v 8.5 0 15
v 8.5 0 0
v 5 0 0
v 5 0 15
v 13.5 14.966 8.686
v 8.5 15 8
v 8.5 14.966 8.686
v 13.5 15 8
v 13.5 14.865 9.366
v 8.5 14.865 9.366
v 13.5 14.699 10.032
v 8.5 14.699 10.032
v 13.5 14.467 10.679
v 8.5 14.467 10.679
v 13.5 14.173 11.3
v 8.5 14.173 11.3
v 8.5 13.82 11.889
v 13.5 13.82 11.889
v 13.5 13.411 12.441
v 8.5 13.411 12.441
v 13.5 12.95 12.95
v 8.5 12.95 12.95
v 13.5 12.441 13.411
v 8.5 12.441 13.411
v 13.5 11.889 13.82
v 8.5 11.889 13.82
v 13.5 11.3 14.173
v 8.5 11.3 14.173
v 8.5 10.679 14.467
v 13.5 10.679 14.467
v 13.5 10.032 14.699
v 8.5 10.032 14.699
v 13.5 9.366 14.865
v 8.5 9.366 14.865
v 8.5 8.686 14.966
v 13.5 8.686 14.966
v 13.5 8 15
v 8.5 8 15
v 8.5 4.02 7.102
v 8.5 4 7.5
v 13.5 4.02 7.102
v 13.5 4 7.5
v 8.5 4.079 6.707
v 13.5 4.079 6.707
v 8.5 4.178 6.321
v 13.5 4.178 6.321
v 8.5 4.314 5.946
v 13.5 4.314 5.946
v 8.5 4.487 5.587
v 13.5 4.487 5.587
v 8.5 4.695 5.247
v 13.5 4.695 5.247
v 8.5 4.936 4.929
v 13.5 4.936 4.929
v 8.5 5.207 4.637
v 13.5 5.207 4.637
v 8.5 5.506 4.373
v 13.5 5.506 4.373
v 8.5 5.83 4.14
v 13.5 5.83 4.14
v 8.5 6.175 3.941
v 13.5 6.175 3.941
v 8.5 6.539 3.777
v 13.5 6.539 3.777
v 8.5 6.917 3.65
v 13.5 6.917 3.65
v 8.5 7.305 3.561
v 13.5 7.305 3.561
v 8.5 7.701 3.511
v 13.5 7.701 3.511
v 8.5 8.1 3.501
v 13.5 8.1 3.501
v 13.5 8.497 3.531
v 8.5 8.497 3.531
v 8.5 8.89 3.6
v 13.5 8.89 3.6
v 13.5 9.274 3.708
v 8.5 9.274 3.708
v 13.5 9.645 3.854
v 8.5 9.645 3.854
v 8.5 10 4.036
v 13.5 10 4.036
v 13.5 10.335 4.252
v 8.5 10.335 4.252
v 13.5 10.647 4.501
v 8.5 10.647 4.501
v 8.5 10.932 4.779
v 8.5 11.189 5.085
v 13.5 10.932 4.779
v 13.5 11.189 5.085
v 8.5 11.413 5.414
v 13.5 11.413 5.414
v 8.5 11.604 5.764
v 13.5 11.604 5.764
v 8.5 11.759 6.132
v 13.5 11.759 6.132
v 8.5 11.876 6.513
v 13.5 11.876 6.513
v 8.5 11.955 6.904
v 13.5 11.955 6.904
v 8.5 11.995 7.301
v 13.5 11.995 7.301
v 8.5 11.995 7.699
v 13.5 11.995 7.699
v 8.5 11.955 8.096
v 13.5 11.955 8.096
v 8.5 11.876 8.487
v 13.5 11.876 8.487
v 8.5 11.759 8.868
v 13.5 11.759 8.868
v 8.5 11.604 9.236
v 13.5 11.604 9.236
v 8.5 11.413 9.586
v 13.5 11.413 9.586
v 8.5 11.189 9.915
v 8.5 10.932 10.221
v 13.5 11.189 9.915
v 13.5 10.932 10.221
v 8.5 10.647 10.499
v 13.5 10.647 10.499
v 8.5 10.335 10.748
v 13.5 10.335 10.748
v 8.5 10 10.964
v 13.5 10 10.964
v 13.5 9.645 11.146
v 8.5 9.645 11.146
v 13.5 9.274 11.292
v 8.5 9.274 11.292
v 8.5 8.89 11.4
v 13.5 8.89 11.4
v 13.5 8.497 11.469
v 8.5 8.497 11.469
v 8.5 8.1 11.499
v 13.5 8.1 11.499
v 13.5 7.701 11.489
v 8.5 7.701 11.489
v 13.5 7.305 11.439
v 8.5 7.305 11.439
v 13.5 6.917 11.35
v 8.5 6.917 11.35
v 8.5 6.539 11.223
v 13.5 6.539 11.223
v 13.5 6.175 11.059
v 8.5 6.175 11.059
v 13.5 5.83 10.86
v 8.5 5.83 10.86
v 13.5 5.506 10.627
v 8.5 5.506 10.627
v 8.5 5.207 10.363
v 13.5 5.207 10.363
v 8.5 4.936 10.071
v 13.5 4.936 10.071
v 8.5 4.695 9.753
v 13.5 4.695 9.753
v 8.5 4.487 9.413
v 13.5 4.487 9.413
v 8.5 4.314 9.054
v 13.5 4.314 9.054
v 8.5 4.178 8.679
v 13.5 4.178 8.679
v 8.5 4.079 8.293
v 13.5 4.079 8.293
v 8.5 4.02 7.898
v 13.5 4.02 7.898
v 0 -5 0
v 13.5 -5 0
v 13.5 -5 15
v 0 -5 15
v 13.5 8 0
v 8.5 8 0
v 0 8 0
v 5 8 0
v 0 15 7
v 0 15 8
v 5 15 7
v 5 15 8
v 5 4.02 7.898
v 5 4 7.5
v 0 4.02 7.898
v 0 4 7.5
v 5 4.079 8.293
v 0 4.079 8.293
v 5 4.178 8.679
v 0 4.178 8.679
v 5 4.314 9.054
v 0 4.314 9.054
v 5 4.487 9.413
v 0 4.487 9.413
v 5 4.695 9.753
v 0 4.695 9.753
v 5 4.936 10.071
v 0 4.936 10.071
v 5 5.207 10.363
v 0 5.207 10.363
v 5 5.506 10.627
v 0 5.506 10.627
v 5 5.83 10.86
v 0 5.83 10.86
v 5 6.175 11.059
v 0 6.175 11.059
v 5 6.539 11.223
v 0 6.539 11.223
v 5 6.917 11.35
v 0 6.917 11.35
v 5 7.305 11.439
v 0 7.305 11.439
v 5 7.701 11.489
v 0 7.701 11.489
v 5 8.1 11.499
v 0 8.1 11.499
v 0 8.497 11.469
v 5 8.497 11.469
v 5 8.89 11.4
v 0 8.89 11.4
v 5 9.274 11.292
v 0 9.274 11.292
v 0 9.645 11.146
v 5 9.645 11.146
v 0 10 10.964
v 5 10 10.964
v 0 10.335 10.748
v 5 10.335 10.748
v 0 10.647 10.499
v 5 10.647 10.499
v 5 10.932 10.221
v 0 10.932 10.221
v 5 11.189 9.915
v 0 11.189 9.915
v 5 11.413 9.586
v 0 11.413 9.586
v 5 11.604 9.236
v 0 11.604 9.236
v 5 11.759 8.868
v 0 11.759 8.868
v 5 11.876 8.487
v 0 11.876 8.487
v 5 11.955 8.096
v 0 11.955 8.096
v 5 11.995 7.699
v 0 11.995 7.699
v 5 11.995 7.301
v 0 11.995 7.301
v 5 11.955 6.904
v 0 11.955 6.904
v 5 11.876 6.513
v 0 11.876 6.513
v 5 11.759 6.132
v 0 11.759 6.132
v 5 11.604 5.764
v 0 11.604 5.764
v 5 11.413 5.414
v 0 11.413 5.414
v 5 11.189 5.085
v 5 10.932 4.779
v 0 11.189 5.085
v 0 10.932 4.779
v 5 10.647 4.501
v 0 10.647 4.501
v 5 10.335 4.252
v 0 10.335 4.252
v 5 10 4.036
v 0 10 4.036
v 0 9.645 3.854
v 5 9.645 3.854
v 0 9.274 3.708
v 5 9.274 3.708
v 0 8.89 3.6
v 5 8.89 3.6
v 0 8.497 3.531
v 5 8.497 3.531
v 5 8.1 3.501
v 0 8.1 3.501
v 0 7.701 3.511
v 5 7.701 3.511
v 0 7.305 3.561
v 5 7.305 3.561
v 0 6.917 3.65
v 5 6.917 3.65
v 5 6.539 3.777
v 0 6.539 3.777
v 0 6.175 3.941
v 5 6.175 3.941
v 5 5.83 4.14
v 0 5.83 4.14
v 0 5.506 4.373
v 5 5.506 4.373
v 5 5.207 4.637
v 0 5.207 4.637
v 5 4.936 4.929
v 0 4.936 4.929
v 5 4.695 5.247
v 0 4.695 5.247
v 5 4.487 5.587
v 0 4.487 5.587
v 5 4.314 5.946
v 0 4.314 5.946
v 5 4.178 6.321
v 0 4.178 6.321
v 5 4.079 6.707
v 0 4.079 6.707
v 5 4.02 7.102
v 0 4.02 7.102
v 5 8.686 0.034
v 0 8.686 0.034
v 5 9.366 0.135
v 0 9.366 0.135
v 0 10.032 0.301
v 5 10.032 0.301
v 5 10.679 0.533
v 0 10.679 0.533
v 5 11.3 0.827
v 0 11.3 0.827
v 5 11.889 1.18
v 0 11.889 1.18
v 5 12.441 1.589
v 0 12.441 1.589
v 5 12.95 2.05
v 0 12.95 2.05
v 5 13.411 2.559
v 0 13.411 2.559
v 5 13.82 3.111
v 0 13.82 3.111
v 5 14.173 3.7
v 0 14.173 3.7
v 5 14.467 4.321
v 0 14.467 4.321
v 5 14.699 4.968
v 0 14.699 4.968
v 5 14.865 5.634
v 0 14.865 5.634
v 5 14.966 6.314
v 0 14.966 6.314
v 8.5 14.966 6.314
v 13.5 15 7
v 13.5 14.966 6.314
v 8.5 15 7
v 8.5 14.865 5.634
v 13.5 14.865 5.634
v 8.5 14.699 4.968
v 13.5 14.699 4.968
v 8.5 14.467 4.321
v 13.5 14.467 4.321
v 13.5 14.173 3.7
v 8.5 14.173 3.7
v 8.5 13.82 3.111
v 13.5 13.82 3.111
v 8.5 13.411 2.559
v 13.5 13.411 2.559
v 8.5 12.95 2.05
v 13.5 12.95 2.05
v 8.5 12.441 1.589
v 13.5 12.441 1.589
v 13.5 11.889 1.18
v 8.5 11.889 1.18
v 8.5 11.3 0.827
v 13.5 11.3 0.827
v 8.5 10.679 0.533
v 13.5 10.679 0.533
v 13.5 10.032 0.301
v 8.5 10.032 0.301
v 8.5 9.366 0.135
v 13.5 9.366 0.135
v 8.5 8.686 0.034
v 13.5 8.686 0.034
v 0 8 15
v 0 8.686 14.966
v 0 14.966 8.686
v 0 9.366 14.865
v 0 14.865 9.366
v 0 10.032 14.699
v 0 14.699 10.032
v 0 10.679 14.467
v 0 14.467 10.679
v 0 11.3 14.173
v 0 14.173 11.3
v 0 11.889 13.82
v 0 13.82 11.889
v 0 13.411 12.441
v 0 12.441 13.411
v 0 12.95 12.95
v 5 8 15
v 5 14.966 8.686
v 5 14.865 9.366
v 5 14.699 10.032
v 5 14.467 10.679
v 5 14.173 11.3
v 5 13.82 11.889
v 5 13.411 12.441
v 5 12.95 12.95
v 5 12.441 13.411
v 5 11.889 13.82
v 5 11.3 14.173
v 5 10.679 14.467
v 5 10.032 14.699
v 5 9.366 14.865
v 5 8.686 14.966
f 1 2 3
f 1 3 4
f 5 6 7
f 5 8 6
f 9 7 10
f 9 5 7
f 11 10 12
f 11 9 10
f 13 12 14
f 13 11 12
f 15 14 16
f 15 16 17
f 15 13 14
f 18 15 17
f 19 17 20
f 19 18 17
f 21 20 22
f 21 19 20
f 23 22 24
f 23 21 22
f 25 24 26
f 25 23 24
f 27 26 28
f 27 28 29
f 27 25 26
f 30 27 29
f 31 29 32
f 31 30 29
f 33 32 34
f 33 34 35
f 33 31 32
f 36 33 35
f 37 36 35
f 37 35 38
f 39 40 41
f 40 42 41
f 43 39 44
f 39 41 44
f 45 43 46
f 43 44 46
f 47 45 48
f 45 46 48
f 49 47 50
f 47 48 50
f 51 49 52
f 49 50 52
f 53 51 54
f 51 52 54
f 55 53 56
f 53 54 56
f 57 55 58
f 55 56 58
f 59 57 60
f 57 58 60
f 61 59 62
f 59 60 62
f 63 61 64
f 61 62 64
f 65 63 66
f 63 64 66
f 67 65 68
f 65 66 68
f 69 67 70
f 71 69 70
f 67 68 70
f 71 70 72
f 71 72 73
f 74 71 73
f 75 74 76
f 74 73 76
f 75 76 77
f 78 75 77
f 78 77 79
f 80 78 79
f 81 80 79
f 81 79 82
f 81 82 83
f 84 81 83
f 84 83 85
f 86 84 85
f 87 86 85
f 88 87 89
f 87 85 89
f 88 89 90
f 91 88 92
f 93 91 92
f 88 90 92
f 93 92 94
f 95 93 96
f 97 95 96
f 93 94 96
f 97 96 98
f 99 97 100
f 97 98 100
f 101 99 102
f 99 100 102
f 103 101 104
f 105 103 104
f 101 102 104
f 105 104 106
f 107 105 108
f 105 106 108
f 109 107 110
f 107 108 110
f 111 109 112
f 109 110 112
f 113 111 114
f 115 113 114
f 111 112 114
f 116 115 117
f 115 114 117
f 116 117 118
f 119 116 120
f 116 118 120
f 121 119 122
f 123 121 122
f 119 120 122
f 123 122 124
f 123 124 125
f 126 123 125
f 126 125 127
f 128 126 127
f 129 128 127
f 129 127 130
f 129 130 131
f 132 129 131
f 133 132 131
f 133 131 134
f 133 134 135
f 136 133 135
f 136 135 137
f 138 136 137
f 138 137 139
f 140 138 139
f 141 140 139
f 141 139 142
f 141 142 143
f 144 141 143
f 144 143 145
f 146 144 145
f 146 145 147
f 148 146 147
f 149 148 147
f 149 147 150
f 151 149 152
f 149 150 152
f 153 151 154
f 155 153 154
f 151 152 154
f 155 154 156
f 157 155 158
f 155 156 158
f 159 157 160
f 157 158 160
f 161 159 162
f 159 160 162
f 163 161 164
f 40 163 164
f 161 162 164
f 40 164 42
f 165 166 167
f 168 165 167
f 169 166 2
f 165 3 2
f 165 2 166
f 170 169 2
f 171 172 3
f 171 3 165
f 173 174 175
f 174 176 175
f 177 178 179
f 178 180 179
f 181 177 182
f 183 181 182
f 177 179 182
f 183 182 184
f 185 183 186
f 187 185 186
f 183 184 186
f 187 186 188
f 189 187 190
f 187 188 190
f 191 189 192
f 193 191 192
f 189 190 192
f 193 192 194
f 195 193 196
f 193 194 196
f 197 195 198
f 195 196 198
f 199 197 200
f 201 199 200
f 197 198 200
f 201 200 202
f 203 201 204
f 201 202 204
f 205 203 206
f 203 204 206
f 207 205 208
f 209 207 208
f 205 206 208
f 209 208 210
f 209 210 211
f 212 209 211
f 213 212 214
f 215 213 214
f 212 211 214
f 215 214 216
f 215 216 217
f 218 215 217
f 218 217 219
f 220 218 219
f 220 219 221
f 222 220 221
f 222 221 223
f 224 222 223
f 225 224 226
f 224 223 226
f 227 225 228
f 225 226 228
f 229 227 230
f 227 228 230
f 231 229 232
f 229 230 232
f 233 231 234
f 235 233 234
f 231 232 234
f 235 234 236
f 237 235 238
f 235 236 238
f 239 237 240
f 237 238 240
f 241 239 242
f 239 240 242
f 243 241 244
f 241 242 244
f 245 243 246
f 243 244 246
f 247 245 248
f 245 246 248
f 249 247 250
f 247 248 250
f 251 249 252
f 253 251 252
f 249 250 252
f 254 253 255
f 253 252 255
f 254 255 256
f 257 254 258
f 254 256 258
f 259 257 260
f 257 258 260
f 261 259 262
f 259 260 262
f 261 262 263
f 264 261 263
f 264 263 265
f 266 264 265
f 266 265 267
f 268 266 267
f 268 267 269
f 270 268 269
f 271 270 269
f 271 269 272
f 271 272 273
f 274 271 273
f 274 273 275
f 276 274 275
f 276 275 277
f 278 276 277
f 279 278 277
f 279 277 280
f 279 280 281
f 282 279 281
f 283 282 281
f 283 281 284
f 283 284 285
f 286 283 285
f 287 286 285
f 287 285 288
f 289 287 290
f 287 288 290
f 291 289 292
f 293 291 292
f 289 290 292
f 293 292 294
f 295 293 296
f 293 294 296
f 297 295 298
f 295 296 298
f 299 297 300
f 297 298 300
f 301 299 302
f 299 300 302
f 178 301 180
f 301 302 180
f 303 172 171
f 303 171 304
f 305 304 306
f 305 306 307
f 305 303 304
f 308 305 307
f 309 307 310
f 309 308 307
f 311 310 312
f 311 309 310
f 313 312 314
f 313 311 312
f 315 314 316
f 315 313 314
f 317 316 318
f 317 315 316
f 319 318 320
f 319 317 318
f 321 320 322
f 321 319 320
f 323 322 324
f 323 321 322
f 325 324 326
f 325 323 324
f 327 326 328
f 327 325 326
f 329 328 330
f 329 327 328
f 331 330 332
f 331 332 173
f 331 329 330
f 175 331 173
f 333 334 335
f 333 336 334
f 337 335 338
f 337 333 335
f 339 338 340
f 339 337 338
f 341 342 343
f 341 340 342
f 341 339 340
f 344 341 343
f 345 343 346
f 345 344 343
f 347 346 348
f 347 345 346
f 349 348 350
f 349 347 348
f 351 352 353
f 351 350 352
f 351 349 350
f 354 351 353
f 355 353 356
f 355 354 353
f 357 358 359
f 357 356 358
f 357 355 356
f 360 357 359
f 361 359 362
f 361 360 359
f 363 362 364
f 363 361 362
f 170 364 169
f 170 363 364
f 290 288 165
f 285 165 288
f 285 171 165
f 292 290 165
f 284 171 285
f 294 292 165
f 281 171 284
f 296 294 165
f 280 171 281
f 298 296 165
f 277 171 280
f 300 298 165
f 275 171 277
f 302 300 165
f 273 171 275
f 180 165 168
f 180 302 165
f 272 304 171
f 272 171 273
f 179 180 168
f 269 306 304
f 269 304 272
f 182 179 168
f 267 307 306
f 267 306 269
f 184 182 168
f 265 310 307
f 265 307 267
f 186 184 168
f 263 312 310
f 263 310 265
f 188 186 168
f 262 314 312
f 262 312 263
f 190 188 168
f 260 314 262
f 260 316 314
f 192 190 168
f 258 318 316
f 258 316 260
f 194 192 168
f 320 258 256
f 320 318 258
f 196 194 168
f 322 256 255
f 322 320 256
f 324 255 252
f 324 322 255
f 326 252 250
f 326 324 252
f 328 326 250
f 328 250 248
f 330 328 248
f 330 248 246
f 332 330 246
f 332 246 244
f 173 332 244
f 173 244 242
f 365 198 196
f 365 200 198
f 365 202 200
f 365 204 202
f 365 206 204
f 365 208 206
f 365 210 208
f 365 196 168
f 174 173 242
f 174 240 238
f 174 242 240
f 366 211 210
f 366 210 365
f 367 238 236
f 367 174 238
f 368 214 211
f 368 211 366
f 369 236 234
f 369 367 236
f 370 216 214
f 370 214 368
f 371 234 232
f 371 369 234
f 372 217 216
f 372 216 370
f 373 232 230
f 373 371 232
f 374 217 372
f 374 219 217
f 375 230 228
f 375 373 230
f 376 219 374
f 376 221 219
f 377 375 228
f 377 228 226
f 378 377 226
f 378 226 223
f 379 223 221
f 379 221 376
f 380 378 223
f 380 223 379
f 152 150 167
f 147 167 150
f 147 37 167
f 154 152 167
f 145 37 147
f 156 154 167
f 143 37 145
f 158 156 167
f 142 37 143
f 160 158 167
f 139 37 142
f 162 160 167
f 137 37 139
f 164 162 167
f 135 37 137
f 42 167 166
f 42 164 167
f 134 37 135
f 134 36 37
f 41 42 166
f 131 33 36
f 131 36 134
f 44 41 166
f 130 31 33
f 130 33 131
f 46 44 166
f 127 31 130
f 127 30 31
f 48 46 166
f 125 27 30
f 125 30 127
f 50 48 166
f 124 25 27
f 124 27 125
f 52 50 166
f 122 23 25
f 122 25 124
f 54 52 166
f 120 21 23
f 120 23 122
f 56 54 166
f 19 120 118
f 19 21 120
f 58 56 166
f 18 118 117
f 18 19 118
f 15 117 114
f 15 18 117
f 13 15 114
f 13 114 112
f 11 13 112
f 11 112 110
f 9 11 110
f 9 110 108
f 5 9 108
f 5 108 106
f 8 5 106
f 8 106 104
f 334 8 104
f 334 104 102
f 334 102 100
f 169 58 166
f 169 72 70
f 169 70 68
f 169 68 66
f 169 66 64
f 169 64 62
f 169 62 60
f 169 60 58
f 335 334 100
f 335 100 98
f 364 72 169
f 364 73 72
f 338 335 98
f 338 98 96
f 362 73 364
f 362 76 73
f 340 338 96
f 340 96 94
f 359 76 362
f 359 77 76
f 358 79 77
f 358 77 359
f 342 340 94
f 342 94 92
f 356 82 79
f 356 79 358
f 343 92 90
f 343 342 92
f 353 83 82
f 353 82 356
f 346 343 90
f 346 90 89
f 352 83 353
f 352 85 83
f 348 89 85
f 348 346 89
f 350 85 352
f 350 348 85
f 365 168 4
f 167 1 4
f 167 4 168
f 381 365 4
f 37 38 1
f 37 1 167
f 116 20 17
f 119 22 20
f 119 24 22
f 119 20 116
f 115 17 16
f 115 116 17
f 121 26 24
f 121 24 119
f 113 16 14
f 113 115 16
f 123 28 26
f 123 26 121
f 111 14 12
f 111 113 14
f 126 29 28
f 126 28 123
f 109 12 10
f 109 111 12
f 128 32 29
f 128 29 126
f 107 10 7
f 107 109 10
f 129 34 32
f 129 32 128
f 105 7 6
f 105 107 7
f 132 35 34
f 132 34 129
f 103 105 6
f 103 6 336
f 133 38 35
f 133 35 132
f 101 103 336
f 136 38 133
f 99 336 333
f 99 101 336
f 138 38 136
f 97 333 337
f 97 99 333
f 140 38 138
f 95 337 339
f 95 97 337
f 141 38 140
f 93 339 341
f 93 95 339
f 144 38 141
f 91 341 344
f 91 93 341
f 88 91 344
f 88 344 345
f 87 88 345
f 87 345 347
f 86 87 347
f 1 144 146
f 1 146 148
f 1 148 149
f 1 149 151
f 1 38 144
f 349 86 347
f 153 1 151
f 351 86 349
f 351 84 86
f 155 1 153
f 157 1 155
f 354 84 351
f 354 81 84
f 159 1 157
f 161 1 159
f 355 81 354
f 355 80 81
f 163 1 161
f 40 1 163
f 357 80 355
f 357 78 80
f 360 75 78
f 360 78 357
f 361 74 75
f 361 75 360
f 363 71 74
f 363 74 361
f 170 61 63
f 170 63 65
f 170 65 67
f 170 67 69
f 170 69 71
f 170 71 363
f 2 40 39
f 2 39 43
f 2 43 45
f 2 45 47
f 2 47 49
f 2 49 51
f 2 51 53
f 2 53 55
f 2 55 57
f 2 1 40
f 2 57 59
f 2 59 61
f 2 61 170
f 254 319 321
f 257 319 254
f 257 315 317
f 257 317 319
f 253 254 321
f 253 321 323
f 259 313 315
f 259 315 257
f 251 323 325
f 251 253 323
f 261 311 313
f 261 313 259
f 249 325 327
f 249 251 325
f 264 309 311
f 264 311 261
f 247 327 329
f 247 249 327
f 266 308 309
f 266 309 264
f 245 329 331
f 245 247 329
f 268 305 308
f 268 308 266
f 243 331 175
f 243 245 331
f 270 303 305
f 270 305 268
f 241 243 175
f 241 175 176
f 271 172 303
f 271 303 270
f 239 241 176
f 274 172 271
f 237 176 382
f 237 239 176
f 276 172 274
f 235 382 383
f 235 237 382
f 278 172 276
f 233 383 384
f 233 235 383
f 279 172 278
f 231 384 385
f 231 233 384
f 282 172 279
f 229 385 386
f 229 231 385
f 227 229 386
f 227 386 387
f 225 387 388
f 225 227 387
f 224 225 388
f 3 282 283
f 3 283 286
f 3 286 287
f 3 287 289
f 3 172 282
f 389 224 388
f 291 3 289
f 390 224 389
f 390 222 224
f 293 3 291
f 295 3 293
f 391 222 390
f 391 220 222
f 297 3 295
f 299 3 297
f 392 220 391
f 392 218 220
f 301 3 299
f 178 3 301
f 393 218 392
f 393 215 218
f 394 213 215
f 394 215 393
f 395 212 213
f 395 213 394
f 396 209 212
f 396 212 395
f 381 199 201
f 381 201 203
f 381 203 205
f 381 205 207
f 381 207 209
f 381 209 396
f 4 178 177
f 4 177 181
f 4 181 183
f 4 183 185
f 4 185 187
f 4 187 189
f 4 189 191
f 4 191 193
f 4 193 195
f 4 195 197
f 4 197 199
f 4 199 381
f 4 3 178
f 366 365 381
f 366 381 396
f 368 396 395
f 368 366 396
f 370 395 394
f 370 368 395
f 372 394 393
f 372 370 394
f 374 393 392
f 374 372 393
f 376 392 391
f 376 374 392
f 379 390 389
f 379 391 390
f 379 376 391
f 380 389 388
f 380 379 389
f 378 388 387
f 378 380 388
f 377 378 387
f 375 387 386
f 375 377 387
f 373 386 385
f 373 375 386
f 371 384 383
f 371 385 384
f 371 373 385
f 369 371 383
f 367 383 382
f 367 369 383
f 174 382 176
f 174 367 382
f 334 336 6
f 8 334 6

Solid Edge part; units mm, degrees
sketch "Sketch1" plane through (0, 0, 0) normal (0, -1, 0) x (1, 0, 0)
  line L0 (13.5, 0) -> (0, 0)
  line L1 (0, 0) -> (0, 15)
  line L2 (0, 15) -> (13.5, 15)
  line L3 (13.5, 15) -> (13.5, 0)
extrude "Protrusion1" add sketch "Sketch1" along normal blind 5
sketch "Sketch2" plane through (18.75, 0, 7.5) normal (0, 1, 0) x (-1, 0, 0)
  line L0 (13.75, -7.5) -> (13.75, 7.5)
  line L1 (13.75, 7.5) -> (18.75, 7.5)
  line L2 (18.75, 7.5) -> (18.75, -7.5)
  line L3 (18.75, -7.5) -> (13.75, -7.5)
extrude "ExtrudedProtrusion_3" add sketch "Sketch2" along normal blind 15
sketch "Sketch3" plane through (0, 5, 7.5) normal (-1, 0, 0) x (0, -1, 0)
  circle A0 centre (-3, 0) radius 4
extrude "Cutout1" cut sketch "Sketch3" against normal through all
fillet "Round1" radius 7 2 edges at (2.5, 15, 15) (2.5, 15, 0)
mirror "Mirror1" about plane through (6.75, 5, 7.5) normal (-1, 0, 0) of "ExtrudedProtrusion_3", "Cutout1"
fillet "Round2" radius 7 2 edges at (11, 15, 15) (11, 15, 0)
